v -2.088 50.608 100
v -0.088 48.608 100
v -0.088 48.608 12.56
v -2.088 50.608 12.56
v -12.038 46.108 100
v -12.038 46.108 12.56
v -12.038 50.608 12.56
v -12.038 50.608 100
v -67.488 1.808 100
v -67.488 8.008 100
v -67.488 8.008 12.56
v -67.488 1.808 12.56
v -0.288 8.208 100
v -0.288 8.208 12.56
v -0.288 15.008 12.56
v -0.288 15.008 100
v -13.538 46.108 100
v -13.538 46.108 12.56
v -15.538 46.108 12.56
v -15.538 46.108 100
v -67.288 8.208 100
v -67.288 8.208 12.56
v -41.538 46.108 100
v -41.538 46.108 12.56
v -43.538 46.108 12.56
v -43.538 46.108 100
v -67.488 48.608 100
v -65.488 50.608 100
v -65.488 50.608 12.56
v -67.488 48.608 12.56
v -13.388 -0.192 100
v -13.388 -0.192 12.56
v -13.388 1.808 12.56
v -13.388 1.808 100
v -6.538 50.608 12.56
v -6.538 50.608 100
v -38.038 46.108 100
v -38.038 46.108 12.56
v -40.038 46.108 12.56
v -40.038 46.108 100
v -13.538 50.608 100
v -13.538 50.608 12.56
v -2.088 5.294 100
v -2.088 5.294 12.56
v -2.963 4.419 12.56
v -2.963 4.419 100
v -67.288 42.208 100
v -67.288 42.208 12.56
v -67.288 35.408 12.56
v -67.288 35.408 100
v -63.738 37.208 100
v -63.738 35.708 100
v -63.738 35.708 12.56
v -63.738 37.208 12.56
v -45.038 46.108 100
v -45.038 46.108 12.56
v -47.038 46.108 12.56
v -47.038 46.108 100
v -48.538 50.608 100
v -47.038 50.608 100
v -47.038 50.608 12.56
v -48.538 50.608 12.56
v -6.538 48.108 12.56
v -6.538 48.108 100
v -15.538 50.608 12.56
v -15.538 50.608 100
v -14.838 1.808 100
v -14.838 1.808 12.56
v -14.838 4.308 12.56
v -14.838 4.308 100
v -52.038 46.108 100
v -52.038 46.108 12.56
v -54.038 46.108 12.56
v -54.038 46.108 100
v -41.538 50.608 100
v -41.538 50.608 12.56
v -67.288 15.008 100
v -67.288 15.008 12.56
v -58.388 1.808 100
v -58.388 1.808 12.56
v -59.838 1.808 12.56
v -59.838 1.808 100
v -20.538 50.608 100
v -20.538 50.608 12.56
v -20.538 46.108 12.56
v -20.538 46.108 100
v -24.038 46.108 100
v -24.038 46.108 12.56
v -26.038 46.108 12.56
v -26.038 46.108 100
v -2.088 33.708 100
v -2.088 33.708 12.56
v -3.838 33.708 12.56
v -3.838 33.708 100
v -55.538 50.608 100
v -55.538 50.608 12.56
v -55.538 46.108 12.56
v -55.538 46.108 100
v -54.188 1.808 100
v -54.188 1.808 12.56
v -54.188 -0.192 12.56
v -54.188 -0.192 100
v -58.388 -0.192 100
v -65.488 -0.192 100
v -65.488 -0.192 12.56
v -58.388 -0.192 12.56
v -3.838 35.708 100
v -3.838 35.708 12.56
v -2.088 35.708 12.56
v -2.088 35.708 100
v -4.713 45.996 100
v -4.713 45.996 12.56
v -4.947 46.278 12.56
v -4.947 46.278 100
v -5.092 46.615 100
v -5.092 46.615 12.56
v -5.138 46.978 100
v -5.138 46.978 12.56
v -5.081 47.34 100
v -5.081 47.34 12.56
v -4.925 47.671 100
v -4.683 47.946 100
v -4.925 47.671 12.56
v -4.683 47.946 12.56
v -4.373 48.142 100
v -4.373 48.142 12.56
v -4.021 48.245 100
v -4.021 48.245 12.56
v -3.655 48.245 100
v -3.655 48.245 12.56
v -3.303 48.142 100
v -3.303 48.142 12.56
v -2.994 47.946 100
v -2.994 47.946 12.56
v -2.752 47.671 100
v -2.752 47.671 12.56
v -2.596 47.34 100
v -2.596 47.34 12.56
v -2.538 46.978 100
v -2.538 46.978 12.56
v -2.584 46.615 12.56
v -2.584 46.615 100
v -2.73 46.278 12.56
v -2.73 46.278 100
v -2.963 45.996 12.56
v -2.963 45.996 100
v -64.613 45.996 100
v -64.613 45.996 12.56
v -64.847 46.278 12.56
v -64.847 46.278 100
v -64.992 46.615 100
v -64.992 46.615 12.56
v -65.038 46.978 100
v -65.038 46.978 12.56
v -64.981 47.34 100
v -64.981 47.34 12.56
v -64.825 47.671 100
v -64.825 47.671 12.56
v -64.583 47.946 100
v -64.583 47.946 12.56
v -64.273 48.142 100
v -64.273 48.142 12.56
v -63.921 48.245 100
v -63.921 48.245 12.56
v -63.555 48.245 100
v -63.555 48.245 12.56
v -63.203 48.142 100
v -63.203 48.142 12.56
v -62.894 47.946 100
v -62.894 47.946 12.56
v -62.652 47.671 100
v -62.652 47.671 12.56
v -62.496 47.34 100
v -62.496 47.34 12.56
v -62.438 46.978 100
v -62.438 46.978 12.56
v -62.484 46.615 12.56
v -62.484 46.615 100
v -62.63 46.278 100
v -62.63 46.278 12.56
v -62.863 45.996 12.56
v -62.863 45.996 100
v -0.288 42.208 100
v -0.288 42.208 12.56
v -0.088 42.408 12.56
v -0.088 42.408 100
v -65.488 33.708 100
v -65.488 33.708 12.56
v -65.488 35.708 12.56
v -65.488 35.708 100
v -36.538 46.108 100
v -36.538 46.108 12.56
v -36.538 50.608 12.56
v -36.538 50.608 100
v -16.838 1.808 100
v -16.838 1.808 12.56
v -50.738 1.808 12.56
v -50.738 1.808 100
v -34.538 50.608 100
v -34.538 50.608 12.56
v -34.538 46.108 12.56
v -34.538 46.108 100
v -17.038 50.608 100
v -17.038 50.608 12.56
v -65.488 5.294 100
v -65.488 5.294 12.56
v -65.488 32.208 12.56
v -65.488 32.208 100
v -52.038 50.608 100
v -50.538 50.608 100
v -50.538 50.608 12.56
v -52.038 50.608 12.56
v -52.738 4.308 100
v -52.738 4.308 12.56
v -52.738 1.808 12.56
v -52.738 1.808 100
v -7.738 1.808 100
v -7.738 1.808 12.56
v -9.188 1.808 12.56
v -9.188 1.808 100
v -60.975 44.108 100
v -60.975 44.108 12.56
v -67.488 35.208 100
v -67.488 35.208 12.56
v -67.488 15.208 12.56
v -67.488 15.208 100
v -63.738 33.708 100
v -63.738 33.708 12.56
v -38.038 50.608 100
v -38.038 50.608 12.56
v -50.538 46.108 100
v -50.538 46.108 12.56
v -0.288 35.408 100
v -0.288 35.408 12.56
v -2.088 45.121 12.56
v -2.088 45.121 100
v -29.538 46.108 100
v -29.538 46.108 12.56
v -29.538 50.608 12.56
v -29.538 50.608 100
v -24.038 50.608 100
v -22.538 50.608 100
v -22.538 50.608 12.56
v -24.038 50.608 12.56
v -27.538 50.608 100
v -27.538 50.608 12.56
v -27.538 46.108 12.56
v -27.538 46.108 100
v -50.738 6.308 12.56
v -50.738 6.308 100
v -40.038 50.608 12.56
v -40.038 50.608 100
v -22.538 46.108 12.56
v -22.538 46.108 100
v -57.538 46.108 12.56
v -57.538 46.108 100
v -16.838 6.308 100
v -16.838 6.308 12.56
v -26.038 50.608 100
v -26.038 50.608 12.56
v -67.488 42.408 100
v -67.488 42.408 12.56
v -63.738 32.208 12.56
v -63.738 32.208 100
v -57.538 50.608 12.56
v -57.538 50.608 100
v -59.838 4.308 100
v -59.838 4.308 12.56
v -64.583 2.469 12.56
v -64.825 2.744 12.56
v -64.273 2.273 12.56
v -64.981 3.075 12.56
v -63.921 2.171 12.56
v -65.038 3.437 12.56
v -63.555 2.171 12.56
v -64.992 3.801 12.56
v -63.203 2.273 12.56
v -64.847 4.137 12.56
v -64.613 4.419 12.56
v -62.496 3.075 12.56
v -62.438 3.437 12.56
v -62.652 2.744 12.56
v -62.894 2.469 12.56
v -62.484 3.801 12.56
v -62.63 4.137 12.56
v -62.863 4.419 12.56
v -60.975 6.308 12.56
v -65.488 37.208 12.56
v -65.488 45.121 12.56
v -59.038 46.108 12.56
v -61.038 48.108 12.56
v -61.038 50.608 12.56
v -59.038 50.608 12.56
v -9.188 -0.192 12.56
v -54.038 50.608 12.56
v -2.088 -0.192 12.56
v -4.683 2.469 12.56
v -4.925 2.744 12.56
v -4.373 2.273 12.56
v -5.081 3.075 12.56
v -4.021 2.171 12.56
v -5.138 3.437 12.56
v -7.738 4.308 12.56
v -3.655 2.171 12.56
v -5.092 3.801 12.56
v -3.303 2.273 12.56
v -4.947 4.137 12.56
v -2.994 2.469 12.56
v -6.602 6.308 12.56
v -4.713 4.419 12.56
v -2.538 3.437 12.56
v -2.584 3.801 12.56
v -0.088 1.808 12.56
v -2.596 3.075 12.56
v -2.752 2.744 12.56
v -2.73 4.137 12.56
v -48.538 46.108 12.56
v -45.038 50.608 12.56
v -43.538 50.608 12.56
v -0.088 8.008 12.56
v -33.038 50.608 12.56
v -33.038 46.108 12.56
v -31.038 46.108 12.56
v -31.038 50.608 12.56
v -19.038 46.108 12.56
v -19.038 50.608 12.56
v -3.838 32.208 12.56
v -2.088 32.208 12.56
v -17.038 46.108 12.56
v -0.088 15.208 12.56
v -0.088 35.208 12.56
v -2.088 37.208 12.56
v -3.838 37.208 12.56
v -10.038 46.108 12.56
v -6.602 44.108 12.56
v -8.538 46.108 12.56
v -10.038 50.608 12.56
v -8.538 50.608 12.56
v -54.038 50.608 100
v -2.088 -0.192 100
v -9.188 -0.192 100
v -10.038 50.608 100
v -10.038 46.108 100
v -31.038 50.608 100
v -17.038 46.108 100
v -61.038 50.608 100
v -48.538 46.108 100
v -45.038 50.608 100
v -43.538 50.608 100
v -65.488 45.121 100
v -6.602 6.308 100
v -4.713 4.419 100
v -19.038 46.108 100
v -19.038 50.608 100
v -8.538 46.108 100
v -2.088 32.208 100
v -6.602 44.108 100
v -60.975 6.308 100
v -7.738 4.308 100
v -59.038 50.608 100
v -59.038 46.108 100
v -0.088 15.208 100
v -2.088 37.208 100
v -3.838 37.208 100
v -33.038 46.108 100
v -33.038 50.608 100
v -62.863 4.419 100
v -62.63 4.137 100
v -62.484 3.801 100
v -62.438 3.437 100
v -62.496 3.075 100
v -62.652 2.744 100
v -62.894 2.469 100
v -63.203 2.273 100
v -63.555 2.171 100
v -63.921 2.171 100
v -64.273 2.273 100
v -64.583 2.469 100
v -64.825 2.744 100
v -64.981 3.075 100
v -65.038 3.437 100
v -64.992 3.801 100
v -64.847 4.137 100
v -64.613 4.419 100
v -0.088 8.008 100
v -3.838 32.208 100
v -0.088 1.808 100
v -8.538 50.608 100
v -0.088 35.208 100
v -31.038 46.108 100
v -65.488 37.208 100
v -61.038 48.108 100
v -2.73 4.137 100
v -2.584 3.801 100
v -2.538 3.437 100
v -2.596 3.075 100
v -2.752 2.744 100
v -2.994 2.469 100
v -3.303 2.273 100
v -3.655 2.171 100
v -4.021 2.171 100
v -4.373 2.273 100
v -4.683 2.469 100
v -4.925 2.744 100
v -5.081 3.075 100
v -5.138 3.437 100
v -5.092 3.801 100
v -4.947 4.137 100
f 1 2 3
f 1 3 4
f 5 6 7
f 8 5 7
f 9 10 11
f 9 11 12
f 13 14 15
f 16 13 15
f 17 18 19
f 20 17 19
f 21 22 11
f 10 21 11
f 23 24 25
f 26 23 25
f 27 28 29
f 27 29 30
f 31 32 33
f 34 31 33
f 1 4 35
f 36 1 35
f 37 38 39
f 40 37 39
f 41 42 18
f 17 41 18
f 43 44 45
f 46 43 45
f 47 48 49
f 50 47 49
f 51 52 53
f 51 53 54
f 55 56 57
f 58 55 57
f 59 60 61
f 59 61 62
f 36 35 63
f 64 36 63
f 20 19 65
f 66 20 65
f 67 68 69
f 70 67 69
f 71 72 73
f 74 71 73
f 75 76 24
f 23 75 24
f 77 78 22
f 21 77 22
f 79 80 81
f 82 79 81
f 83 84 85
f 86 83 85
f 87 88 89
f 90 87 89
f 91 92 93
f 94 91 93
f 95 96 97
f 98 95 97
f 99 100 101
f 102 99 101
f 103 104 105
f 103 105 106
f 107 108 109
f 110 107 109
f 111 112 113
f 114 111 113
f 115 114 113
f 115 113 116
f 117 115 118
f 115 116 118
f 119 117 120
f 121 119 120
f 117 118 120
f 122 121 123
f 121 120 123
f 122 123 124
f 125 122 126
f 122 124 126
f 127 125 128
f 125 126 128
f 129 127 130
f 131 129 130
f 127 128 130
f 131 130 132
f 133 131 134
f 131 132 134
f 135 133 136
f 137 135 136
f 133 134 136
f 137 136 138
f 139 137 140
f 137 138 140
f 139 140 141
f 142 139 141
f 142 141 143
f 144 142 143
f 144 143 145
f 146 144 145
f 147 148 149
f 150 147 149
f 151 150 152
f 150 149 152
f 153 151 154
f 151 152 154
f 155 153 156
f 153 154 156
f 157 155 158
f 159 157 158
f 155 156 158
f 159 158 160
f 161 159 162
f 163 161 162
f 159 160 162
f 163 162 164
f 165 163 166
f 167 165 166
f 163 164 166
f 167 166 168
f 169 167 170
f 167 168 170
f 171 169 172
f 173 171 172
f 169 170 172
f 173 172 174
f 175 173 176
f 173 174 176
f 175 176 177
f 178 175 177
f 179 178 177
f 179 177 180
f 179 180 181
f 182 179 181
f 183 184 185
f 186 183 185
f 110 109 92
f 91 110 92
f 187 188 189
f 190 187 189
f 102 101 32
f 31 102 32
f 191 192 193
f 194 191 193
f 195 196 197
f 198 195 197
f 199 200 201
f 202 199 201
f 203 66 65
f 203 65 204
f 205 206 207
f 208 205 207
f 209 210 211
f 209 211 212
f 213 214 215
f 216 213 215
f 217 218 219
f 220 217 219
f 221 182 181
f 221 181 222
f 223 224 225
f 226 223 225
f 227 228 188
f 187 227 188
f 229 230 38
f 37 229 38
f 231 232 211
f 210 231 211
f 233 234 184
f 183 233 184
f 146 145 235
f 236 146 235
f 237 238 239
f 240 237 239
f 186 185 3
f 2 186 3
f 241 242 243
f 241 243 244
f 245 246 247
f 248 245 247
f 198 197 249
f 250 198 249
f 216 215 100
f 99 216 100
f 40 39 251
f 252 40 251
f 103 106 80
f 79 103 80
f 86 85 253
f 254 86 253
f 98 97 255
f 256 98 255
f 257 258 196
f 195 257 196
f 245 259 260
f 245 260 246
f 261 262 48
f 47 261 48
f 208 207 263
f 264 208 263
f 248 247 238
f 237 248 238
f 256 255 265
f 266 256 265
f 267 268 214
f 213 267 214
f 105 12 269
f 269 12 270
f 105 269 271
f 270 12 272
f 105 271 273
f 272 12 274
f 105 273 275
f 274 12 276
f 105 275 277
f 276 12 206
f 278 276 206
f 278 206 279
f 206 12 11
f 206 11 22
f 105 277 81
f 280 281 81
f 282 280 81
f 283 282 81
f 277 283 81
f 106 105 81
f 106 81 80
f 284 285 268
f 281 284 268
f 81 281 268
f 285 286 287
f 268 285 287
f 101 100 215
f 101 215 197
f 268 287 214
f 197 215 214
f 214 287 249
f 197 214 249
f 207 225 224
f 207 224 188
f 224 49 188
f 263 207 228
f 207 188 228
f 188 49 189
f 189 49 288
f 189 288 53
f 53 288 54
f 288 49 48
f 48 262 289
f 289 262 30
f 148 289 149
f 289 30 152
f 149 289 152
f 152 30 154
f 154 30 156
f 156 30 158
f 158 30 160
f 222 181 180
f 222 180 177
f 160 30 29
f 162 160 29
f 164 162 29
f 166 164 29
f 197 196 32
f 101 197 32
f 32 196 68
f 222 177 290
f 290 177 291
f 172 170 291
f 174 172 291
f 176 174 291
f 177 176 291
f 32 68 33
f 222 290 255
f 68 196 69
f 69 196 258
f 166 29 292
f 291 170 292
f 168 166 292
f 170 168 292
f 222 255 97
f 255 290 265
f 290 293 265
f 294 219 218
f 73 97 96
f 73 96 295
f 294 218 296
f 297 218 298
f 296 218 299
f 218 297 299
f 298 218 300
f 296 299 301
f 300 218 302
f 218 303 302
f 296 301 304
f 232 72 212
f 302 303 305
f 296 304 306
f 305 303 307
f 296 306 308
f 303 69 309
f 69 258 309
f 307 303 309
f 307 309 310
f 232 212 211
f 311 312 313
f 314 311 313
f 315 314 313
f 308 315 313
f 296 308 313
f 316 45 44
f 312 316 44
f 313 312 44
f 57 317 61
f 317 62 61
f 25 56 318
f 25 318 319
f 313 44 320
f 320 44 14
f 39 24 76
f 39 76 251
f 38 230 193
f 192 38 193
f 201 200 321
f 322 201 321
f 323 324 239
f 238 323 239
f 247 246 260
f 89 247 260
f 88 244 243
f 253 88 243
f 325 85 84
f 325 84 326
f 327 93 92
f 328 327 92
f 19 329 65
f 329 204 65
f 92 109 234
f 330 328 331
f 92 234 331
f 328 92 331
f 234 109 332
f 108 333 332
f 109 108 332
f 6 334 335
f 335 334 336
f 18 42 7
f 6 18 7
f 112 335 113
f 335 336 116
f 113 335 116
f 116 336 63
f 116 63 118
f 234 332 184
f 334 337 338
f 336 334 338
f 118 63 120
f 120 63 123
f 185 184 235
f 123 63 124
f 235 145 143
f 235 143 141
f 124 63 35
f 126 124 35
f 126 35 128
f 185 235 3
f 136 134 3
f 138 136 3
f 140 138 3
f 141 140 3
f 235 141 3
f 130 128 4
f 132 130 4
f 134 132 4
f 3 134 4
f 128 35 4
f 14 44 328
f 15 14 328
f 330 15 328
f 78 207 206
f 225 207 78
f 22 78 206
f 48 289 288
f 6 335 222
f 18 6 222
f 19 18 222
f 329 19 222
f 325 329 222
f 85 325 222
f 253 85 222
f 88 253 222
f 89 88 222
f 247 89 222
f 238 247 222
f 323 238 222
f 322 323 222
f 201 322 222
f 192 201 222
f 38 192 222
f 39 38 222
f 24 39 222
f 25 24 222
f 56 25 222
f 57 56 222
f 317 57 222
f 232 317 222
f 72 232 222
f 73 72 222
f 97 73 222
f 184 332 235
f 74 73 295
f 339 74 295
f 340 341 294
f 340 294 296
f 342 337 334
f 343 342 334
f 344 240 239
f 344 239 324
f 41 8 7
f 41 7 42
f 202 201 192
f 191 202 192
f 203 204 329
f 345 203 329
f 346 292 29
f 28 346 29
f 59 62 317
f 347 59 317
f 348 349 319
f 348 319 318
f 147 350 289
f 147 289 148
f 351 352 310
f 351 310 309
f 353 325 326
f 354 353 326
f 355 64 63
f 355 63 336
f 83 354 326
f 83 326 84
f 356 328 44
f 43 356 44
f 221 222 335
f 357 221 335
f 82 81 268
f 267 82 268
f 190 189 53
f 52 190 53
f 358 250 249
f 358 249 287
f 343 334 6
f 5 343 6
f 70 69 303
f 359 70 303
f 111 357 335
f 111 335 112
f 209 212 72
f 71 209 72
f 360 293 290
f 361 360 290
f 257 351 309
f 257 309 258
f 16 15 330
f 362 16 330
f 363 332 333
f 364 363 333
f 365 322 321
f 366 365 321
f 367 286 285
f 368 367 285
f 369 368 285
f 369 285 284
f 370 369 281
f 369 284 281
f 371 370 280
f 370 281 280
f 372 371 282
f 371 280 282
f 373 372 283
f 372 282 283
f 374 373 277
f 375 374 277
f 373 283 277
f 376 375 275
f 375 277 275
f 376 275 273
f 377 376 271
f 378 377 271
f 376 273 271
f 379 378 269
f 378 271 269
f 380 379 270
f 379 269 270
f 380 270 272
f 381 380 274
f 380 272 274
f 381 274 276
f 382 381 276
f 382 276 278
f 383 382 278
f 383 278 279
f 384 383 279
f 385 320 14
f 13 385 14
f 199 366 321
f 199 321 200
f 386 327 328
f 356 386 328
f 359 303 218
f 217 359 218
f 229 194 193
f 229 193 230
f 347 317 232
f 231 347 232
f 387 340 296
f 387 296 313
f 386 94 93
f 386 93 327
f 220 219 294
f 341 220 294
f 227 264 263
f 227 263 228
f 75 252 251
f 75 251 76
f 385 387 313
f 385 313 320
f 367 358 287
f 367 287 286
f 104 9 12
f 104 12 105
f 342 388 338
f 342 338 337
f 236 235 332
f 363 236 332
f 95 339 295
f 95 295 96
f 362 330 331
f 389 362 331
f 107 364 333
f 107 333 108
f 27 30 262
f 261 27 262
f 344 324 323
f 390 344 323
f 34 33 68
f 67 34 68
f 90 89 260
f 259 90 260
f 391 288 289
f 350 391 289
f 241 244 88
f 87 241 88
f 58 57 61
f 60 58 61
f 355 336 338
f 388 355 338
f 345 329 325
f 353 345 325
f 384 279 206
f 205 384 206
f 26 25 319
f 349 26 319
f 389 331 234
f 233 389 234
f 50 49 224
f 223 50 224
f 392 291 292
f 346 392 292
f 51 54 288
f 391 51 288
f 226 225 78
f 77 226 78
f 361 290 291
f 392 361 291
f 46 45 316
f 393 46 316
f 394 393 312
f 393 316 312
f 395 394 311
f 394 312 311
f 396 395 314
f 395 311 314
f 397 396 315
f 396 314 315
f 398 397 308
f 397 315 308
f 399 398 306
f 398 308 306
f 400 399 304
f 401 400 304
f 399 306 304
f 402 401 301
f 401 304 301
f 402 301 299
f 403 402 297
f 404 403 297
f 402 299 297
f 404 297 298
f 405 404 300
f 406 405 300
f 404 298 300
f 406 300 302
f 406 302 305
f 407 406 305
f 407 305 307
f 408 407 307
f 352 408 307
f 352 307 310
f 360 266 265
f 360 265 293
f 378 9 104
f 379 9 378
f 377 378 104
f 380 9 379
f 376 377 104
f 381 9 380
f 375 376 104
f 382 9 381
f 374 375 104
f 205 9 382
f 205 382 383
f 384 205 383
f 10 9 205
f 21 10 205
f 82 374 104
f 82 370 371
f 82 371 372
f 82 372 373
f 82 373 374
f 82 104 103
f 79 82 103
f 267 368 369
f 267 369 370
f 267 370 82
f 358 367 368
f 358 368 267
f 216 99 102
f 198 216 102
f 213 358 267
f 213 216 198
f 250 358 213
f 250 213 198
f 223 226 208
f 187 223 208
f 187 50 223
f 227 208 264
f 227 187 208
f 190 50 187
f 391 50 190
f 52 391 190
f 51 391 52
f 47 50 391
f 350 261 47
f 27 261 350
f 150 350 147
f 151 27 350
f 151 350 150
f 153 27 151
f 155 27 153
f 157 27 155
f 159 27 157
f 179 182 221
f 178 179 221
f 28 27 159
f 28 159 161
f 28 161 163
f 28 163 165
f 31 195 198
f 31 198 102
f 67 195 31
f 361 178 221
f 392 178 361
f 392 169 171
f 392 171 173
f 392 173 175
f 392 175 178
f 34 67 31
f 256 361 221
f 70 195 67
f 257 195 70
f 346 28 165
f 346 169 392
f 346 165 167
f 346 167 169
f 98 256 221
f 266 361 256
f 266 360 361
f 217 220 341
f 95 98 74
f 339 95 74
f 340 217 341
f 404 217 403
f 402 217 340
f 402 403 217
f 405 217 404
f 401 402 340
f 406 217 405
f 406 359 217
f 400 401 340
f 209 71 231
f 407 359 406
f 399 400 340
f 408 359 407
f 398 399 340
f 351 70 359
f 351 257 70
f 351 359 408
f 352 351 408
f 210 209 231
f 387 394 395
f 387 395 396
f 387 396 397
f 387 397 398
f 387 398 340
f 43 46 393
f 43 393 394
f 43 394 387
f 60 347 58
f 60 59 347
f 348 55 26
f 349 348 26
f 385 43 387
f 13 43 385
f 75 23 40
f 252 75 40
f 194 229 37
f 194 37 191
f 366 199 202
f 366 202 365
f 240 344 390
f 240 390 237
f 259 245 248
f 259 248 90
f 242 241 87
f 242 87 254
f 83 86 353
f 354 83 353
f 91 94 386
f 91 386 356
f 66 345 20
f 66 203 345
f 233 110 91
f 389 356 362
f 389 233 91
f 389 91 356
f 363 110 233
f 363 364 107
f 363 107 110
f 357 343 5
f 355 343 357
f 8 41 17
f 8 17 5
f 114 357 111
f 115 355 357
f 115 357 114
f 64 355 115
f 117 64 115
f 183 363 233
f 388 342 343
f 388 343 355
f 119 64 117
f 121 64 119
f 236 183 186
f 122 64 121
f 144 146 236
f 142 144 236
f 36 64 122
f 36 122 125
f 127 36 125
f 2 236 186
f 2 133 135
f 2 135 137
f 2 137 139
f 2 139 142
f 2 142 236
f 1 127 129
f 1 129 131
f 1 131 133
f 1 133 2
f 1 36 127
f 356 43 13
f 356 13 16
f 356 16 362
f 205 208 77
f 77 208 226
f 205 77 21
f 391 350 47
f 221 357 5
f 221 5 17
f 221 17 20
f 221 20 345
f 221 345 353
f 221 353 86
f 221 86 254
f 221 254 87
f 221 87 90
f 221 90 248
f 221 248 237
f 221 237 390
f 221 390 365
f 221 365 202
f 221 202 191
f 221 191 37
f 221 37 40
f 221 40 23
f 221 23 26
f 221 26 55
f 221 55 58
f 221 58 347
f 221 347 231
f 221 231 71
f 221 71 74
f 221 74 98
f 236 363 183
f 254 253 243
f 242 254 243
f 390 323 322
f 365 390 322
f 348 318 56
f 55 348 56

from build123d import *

# Parameters (mm, degrees)
BOSS_EXTRUDE1_DEPTH = 87.4395


with BuildPart() as part:
    # Sketch1 → Boss-Extrude1 (new body)
    with BuildSketch(Plane.XY.offset(12.5605)):
        Polygon((-54.188249545, 1.80757214), (-54.188249545, -0.19242786), (-13.388249545, -0.19242786), (-13.388249545, 1.80757214), (-14.838249545, 1.80757214), (-14.838249545, 4.30757214), (-7.738249545, 4.30757214), (-7.738249545, 1.80757214), (-9.188249545, 1.80757214), (-9.188249545, -0.19242786), (-2.088249216, -0.19242786), (-0.088249545, 1.807571812), (-0.088249545, 8.007572024), (-0.288249545, 8.207572024), (-0.288249545, 15.00757214), (-0.088249545, 15.20757214), (-0.088249545, 35.20757214), (-0.288249545, 35.40757214), (-0.288249545, 42.207572024), (-0.088249545, 42.407572024), (-0.088249545, 48.607572237), (-2.088249448, 50.60757214), (-6.538249545, 50.60757214), (-6.538249545, 48.10757214), (-8.538249545, 46.10757214), (-8.538249545, 50.60757214), (-10.038249545, 50.60757214), (-10.038249545, 46.10757214), (-12.038249545, 46.10757214), (-12.038249545, 50.60757214), (-13.538249545, 50.60757214), (-13.538249545, 46.10757214), (-15.538249545, 46.10757214), (-15.538249545, 50.60757214), (-17.038249545, 50.60757214), (-17.038249545, 46.10757214), (-19.038249545, 46.10757214), (-19.038249545, 50.60757214), (-20.538249545, 50.60757214), (-20.538249545, 46.10757214), (-22.538249545, 46.10757214), (-22.538249545, 50.60757214), (-24.038249545, 50.60757214), (-24.038249545, 46.10757214), (-26.038249545, 46.10757214), (-26.038249545, 50.60757214), (-27.538249545, 50.60757214), (-27.538249545, 46.10757214), (-29.538249545, 46.10757214), (-29.538249545, 50.60757214), (-31.038249545, 50.60757214), (-31.038249545, 46.10757214), (-33.038249545, 46.10757214), (-33.038249545, 50.60757214), (-34.538249545, 50.60757214), (-34.538249545, 46.10757214), (-36.538249545, 46.10757214), (-36.538249545, 50.60757214), (-38.038249545, 50.60757214), (-38.038249545, 46.10757214), (-40.038249545, 46.10757214), (-40.038249545, 50.60757214), (-41.538249545, 50.60757214), (-41.538249545, 46.10757214), (-43.538249545, 46.10757214), (-43.538249545, 50.60757214), (-45.038249545, 50.60757214), (-45.038249545, 46.10757214), (-47.038249545, 46.10757214), (-47.038249545, 50.60757214), (-48.538249545, 50.60757214), (-48.538249545, 46.10757214), (-50.538249545, 46.10757214), (-50.538249545, 50.60757214), (-52.038249545, 50.60757214), (-52.038249545, 46.10757214), (-54.038249545, 46.10757214), (-54.038249545, 50.60757214), (-55.538249545, 50.60757214), (-55.538249545, 46.10757214), (-57.538249545, 46.10757214), (-57.538249545, 50.60757214), (-59.038249545, 50.60757214), (-59.038249545, 46.10757214), (-61.038249545, 48.10757214), (-61.038249545, 50.60757214), (-65.488249642, 50.60757214), (-67.488249545, 48.607572237), (-67.488249545, 42.407572024), (-67.288249545, 42.207572024), (-67.288249545, 35.40757214), (-67.488249545, 35.20757214), (-67.488249545, 15.20757214), (-67.288249545, 15.00757214), (-67.288249545, 8.207572024), (-67.488249545, 8.007572024), (-67.488249545, 1.807571812), (-65.488249874, -0.19242786), (-58.388249545, -0.19242786), (-58.388249545, 1.80757214), (-59.838249545, 1.80757214), (-59.838249545, 4.30757214), (-52.738249545, 4.30757214), (-52.738249545, 1.80757214), align=None)
        with BuildLine():
            Line((-2.088249545, 32.20757214), (-2.088249545, 5.294016009))
            Line((-2.088249545, 5.294016009), (-2.963249358, 4.419016196))
            ThreePointArc((-2.963249358, 4.419016196), (-3.838249708, 2.15757214), (-4.713249491, 4.419016416))
            Line((-4.713249491, 4.419016416), (-6.601805216, 6.30757214))
            Line((-6.601805216, 6.30757214), (-16.838249545, 6.30757214))
            Line((-16.838249545, 6.30757214), (-16.838249545, 1.807572024))
            Line((-16.838249545, 1.807572024), (-50.738249545, 1.807572024))
            Line((-50.738249545, 1.807572024), (-50.738249545, 6.30757214))
            Line((-50.738249545, 6.30757214), (-60.974693874, 6.30757214))
            Line((-60.974693874, 6.30757214), (-62.863249599, 4.419016416))
            ThreePointArc((-62.863249599, 4.419016416), (-63.738249382, 2.15757214), (-64.613249732, 4.419016196))
            Line((-64.613249732, 4.419016196), (-65.488249545, 5.294016009))
            Line((-65.488249545, 5.294016009), (-65.488249545, 32.20757214))
            Line((-65.488249545, 32.20757214), (-63.738249545, 32.20757214))
            Line((-63.738249545, 32.20757214), (-63.738249545, 33.70757214))
            Line((-63.738249545, 33.70757214), (-65.488249545, 33.70757214))
            Line((-65.488249545, 33.70757214), (-65.488249545, 35.70757214))
            Line((-65.488249545, 35.70757214), (-63.738249545, 35.70757214))
            Line((-63.738249545, 35.70757214), (-63.738249545, 37.20757214))
            Line((-63.738249545, 37.20757214), (-65.488249545, 37.20757214))
            Line((-65.488249545, 37.20757214), (-65.488249545, 45.121128024))
            Line((-65.488249545, 45.121128024), (-64.613249603, 45.996127967))
            ThreePointArc((-64.613249603, 45.996127967), (-63.738249551, 48.25757214), (-62.863249479, 45.996127974))
            Line((-62.863249479, 45.996127974), (-60.974693645, 44.10757214))
            Line((-60.974693645, 44.10757214), (-6.601805445, 44.10757214))
            Line((-6.601805445, 44.10757214), (-4.713249611, 45.996127974))
            ThreePointArc((-4.713249611, 45.996127974), (-3.838249539, 48.25757214), (-2.963249487, 45.996127967))
            Line((-2.963249487, 45.996127967), (-2.088249545, 45.121128024))
            Line((-2.088249545, 45.121128024), (-2.088249545, 37.20757214))
            Line((-2.088249545, 37.20757214), (-3.838249545, 37.20757214))
            Line((-3.838249545, 37.20757214), (-3.838249545, 35.70757214))
            Line((-3.838249545, 35.70757214), (-2.088249545, 35.70757214))
            Line((-2.088249545, 35.70757214), (-2.088249545, 33.70757214))
            Line((-2.088249545, 33.70757214), (-3.838249545, 33.70757214))
            Line((-3.838249545, 33.70757214), (-3.838249545, 32.20757214))
            Line((-3.838249545, 32.20757214), (-2.088249545, 32.20757214))
        make_face(mode=Mode.SUBTRACT)
    extrude(amount=BOSS_EXTRUDE1_DEPTH)


solid = part.part
